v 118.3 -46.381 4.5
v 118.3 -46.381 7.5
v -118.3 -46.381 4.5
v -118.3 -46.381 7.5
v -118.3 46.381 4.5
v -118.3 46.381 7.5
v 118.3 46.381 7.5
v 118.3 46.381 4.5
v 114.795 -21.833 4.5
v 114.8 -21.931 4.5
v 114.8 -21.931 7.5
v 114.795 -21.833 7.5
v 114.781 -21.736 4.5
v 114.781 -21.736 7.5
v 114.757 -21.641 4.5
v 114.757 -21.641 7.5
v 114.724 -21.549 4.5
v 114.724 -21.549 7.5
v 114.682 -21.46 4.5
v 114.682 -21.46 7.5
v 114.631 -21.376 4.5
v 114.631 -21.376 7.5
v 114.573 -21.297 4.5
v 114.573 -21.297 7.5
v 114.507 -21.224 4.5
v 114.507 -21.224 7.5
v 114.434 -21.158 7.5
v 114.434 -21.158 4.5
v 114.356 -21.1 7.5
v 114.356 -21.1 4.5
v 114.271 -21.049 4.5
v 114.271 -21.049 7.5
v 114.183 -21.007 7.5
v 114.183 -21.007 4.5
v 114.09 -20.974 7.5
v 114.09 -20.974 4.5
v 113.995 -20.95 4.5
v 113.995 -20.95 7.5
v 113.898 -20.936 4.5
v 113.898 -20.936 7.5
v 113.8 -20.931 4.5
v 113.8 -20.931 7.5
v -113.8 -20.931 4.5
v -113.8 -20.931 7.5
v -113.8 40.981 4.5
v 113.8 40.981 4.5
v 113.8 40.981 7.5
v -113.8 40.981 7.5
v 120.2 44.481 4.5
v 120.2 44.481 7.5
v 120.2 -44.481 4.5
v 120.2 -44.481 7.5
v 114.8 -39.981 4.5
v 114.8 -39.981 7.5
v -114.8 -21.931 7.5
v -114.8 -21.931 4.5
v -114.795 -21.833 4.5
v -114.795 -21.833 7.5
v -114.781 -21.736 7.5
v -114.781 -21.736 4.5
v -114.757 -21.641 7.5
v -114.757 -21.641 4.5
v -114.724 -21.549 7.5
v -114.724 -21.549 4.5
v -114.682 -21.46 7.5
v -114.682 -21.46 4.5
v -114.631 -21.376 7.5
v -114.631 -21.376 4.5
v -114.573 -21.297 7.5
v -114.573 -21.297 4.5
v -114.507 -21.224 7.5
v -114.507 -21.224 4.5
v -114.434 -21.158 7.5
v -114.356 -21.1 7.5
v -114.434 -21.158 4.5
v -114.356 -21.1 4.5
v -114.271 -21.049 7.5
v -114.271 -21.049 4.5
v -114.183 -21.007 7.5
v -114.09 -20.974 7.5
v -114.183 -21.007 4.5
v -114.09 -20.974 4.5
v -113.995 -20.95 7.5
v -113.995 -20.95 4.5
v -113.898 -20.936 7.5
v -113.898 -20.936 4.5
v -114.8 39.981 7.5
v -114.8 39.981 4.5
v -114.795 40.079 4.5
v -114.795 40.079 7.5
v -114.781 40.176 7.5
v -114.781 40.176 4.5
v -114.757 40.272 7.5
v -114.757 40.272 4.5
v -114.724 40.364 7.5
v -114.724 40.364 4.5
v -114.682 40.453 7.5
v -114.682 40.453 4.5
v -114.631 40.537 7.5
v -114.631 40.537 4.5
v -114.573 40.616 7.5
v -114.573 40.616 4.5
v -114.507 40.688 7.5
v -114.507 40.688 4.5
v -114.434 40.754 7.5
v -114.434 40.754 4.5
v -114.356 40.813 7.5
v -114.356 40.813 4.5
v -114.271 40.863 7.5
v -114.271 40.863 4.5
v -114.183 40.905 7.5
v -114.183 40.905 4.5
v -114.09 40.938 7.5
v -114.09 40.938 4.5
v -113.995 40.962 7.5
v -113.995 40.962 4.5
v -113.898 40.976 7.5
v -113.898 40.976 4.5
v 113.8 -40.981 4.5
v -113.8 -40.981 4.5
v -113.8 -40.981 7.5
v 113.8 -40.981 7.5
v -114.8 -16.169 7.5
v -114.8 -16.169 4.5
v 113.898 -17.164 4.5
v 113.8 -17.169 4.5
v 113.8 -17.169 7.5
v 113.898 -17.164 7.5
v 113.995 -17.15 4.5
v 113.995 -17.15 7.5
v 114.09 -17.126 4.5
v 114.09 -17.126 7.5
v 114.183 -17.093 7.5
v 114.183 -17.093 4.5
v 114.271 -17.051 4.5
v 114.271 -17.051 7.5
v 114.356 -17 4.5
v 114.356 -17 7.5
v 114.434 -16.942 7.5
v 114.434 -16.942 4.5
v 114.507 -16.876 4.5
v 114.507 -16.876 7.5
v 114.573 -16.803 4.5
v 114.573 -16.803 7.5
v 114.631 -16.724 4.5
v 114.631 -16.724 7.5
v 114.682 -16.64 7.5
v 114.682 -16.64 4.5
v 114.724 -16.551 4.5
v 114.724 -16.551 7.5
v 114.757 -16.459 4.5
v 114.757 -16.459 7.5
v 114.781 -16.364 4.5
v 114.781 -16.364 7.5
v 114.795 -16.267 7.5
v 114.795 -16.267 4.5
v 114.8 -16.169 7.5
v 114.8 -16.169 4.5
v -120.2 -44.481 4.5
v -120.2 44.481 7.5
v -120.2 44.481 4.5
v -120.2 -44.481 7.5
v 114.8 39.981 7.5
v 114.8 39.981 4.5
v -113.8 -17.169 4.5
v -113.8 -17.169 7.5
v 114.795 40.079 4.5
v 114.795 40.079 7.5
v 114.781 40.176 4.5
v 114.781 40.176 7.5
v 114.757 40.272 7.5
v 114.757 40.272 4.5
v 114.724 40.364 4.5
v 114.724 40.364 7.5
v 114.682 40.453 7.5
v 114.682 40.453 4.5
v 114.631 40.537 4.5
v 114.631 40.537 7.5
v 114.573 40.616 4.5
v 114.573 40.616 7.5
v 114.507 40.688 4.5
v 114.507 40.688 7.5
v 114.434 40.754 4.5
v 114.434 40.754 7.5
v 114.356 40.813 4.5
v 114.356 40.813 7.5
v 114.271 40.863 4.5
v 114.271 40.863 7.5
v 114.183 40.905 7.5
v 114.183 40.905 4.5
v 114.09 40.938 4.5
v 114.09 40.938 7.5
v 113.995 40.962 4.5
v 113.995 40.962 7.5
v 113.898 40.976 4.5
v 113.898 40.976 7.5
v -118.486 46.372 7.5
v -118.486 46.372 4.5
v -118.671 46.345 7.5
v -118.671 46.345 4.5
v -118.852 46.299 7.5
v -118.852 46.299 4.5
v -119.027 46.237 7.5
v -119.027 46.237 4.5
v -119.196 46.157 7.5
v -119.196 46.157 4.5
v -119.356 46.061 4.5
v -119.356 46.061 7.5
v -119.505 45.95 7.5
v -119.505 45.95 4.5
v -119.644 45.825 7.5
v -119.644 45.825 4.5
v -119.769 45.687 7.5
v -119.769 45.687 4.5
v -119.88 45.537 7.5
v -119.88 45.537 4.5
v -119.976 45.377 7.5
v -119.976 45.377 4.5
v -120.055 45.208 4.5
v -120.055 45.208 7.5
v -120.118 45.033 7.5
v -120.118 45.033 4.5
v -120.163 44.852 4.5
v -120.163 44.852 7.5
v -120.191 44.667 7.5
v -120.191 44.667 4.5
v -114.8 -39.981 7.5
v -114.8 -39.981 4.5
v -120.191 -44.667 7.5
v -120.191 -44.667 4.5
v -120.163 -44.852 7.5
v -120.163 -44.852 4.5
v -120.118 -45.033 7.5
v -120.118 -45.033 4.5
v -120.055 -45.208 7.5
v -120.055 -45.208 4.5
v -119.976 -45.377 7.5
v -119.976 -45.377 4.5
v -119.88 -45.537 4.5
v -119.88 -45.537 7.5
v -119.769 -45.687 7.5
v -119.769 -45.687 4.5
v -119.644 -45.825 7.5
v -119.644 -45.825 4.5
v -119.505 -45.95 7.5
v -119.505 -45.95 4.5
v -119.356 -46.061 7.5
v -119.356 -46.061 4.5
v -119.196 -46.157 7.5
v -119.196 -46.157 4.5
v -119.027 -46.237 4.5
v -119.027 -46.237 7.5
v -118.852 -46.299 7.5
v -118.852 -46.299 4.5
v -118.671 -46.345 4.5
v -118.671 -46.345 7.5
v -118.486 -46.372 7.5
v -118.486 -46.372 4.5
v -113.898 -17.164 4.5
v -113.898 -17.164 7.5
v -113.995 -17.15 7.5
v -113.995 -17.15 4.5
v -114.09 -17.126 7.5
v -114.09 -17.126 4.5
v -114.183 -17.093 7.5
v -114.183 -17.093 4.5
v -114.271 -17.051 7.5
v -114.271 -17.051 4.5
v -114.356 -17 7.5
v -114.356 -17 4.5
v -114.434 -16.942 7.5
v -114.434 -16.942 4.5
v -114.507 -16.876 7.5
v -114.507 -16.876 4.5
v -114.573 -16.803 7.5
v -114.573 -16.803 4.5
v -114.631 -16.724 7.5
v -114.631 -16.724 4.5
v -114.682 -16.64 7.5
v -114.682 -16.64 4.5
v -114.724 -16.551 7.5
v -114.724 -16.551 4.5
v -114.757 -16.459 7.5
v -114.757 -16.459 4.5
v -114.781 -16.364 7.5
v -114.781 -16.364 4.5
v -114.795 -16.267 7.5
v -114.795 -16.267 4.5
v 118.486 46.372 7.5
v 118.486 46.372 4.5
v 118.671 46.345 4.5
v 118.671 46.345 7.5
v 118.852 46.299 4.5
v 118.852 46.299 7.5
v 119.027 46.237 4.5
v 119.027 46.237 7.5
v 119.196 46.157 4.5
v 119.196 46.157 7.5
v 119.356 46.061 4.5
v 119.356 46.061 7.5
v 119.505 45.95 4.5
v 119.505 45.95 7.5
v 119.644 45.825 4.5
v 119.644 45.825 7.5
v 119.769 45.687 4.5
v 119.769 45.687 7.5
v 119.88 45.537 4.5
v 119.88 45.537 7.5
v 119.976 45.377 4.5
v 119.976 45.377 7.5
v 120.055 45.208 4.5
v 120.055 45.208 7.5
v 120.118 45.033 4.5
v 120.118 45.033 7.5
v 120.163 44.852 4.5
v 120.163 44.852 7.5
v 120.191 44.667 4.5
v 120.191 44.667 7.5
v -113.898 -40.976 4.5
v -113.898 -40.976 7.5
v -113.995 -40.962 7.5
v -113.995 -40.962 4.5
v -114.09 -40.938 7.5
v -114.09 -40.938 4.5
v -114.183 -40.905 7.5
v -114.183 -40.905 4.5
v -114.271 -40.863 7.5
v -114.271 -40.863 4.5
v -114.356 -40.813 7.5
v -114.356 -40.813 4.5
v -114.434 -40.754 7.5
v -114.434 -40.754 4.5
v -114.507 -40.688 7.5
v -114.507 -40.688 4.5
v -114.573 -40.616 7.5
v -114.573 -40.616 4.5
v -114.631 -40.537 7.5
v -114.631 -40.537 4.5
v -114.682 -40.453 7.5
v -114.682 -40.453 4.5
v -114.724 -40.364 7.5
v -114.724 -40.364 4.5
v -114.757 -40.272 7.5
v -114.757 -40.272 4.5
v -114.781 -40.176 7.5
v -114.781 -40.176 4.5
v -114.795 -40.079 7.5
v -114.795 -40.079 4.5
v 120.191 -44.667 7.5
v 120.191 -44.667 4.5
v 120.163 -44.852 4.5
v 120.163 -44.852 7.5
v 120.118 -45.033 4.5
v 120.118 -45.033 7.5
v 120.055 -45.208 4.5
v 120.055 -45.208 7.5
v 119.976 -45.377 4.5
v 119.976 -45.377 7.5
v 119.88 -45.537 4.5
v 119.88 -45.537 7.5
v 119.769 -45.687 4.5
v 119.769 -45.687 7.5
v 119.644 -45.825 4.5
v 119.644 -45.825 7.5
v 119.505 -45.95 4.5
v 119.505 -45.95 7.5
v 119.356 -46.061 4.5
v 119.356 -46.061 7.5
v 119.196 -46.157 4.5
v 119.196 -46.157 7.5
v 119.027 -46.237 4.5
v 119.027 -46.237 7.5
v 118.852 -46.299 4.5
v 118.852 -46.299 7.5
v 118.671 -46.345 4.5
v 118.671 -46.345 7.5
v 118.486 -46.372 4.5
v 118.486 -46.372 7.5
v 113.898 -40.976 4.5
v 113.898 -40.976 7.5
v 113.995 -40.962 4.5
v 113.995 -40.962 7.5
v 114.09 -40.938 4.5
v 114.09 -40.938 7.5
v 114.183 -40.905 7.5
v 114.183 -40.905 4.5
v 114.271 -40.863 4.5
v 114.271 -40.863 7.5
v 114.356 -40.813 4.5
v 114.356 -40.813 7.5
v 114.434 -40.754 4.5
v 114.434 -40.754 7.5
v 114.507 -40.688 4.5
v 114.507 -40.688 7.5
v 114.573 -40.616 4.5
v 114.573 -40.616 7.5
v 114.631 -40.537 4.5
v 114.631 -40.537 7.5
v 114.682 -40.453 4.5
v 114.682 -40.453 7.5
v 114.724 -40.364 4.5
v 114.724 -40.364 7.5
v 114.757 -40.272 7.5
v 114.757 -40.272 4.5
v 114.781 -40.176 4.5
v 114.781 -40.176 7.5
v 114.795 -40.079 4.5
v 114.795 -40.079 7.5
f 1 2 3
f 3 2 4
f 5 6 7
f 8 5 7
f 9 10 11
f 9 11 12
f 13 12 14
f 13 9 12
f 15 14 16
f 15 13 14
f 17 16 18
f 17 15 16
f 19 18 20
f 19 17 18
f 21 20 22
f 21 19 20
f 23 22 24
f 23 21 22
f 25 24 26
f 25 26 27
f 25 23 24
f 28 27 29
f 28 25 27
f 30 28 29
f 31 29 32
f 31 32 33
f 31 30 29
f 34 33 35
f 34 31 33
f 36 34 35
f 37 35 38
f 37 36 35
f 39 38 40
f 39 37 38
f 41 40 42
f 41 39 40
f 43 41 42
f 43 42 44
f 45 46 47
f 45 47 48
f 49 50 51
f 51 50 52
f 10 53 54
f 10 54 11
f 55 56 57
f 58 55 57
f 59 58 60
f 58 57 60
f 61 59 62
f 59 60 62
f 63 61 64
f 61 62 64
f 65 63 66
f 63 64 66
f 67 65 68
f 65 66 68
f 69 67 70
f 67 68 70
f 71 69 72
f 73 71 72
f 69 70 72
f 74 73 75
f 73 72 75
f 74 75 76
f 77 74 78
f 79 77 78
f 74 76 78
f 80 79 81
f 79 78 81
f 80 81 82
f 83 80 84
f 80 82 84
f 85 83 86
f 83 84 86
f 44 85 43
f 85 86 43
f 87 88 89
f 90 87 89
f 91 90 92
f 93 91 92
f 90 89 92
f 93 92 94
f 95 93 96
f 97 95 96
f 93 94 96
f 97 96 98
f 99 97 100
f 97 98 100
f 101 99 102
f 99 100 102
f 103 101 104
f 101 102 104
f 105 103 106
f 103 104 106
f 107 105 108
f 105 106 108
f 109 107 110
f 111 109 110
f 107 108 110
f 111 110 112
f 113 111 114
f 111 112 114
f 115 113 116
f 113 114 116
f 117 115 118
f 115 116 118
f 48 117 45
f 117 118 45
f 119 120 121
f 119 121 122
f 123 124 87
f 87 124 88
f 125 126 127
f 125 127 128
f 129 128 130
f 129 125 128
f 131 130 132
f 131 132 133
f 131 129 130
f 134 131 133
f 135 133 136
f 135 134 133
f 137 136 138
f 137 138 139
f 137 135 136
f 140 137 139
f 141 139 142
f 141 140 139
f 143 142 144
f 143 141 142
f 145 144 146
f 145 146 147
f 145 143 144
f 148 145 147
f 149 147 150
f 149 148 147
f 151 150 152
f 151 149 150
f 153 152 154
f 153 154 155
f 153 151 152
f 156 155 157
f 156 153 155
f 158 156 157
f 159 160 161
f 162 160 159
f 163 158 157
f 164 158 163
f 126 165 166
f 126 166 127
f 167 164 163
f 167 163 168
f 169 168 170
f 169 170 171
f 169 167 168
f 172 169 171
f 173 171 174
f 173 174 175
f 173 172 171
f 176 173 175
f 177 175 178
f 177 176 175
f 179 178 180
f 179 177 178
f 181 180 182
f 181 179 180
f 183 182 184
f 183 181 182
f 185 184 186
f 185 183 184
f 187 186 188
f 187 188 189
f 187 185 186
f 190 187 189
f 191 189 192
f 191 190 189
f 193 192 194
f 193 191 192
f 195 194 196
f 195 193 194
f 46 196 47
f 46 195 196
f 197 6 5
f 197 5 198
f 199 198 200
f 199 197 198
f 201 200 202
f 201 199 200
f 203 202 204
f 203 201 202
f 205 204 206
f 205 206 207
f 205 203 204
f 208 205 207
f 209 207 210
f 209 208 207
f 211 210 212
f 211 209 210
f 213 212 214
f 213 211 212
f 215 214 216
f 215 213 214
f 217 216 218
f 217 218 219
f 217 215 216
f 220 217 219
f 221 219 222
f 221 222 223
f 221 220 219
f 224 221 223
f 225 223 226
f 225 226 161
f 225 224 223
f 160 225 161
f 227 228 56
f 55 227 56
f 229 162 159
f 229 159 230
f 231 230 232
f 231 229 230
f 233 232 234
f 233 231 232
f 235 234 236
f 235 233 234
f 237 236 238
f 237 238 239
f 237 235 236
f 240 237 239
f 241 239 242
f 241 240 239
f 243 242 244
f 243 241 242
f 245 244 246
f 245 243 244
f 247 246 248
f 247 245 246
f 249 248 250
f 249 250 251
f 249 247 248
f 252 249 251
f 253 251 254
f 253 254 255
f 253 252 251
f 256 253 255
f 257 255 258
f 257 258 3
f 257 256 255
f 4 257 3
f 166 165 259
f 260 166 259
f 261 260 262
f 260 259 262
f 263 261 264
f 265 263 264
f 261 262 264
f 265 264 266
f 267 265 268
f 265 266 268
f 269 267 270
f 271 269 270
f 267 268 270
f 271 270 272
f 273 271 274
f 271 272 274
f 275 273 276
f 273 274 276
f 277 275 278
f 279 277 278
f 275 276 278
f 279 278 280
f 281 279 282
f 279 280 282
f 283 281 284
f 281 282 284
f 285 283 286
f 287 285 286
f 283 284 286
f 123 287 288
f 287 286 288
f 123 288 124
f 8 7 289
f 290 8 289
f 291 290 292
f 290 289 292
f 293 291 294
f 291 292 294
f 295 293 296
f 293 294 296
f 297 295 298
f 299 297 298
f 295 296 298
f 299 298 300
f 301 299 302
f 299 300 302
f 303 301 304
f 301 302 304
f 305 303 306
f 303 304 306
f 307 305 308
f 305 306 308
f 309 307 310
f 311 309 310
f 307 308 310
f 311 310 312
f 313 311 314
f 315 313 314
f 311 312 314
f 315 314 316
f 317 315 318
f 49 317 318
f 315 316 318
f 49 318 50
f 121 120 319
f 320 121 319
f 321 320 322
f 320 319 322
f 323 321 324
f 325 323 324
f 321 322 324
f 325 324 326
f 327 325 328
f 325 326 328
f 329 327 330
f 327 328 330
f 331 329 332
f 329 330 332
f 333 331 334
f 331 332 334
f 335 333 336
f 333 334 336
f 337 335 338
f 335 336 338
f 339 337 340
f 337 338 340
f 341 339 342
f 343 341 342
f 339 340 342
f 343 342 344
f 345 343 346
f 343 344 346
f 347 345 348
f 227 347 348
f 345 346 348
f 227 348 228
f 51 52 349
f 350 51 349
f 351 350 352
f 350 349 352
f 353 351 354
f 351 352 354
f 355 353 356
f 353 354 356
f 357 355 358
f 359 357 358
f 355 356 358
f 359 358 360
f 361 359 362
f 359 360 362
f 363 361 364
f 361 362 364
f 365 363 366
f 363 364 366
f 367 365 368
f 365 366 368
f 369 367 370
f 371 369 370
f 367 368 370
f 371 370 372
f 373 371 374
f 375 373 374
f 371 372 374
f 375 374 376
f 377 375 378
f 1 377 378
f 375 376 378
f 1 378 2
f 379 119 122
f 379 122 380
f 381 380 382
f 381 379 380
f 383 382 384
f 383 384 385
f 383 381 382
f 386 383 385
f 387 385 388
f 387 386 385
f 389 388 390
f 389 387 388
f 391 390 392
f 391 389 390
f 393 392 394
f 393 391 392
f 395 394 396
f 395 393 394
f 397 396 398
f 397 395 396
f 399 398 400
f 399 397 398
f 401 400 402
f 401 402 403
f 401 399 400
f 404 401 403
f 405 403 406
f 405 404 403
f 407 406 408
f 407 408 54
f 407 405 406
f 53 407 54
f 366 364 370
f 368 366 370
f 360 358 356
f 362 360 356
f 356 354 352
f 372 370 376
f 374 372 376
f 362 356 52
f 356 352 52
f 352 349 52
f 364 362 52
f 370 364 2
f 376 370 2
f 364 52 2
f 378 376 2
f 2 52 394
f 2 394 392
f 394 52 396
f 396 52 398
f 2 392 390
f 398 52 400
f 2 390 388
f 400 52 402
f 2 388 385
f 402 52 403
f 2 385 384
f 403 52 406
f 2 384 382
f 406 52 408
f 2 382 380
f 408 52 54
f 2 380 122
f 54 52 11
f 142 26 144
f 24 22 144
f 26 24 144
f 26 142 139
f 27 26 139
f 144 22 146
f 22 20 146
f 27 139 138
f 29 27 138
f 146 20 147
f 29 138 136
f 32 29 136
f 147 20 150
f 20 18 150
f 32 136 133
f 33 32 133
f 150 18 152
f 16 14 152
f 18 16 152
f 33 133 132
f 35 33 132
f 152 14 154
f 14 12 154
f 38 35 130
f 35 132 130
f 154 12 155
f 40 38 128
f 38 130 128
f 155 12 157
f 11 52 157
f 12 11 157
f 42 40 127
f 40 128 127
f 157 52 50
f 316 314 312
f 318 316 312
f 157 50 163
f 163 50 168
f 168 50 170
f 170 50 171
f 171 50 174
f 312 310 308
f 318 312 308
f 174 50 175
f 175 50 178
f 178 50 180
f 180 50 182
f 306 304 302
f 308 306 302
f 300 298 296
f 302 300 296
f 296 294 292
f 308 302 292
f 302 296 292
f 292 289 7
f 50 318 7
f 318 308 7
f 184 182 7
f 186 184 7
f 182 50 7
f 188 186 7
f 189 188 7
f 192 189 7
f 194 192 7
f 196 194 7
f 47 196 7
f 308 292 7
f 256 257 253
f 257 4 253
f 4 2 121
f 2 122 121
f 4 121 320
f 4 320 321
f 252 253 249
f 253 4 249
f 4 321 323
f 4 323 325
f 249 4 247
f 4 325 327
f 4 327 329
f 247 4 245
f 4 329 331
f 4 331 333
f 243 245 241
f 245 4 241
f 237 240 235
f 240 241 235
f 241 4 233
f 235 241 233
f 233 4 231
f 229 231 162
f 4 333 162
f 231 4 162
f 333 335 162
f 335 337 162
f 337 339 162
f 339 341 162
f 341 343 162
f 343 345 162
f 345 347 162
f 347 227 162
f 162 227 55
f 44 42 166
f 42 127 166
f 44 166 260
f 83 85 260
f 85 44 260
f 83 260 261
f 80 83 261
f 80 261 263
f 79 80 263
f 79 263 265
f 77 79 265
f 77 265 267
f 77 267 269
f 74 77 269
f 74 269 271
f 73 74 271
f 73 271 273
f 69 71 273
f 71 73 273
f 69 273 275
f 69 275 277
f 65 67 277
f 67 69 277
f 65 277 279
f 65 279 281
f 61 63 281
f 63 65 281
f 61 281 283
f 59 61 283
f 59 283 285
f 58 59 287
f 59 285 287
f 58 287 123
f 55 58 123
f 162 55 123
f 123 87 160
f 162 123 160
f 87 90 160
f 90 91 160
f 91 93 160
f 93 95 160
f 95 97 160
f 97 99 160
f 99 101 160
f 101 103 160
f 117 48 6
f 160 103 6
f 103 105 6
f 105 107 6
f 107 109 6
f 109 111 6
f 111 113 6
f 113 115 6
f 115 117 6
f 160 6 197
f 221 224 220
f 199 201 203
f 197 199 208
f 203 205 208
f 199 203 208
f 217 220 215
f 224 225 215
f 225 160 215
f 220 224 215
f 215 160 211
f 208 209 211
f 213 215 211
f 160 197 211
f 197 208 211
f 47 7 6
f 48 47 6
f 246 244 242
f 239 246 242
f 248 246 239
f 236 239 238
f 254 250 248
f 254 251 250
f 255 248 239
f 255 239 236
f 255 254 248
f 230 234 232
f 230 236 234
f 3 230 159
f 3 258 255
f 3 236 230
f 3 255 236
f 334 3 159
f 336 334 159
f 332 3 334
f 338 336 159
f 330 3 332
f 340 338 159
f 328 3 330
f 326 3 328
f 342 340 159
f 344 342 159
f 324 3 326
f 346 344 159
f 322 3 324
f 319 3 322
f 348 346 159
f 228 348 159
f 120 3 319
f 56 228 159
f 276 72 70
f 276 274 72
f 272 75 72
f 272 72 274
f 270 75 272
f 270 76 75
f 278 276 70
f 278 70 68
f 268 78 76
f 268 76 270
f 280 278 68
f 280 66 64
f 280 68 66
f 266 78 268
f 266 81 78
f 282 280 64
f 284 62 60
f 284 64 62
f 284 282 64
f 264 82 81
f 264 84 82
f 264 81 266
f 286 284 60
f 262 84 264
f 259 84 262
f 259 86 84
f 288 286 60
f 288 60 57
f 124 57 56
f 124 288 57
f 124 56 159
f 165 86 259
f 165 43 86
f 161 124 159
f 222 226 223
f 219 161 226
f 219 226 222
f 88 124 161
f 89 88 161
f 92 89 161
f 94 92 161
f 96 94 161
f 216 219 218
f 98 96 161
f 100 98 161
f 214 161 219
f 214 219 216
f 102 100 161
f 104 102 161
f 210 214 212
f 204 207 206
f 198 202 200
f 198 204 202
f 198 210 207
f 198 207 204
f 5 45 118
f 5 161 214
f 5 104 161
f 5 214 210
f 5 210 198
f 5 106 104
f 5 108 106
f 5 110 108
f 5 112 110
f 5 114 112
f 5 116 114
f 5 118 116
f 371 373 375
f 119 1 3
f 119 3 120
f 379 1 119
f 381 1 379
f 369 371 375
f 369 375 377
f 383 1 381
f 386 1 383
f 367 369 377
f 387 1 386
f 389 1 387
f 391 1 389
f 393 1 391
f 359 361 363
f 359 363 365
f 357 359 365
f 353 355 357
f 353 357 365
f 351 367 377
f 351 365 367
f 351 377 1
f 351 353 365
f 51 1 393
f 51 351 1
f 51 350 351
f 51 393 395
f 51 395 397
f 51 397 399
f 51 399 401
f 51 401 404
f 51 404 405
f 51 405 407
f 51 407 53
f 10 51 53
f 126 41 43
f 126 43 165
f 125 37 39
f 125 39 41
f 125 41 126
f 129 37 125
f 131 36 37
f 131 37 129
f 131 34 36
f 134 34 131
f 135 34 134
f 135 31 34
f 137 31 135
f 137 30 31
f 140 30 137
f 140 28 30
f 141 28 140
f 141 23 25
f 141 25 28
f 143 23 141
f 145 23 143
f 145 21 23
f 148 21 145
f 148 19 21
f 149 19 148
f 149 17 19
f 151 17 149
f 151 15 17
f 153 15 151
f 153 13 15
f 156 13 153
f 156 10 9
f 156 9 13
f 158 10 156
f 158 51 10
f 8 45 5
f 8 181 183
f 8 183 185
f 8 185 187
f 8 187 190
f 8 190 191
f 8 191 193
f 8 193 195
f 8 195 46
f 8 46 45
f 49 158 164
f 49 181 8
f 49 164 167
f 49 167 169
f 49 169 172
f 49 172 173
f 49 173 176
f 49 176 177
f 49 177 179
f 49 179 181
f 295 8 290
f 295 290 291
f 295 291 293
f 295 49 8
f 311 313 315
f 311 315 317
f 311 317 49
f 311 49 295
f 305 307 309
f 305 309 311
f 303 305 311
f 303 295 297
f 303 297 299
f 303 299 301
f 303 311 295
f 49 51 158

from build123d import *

# Parameters (mm, degrees)
SHAPEBINDER_R   = 1.75
PAD020_DEPTH    = 3
SKETCH057_R     = 1.75
PAD021_DEPTH    = 3
POCKET032_DEPTH = 3


with BuildPart() as body:
    # ShapeBinder → Pad020 (new body)
    with BuildSketch(Plane(origin=(-71.291879, -3.78464, 4.5), x_dir=(0, 1, 0), z_dir=(0, 0, 1))):
        with BuildLine():
            Line((44.76589, 42.508121), (44.76589, -71.291879))
            Line((44.76589, -71.291879), (46.11589, -71.291879))
            ThreePointArc((46.11589, -71.291879), (47.86589, -69.541879), (49.61589, -71.291879))
            Line((49.61589, -71.291879), (50.26589, -71.291879))
            Line((50.26589, -71.291879), (50.26589, 47.008121))
            ThreePointArc((50.26589, 47.008121), (49.680103, 48.422335), (48.26589, 49.008121))
            Line((48.26589, 49.008121), (-40.69661, 49.008121))
            ThreePointArc((-40.69661, 49.008121), (-42.110824, 48.422335), (-42.69661, 47.008121))
            Line((-42.69661, 47.008121), (-42.69661, -71.291879))
            Line((-42.69661, -71.291879), (-42.04661, -71.291879))
            ThreePointArc((-42.04661, -71.291879), (-40.29661, -69.541879), (-38.54661, -71.291879))
            Line((-38.54661, -71.291879), (-37.19661, -71.291879))
            Line((-37.19661, -71.291879), (-37.19661, 42.508121))
            ThreePointArc((-37.19661, 42.508121), (-36.903717, 43.215228), (-36.19661, 43.508121))
            Line((-36.19661, 43.508121), (-18.14661, 43.508121))
            ThreePointArc((-18.14661, 43.508121), (-17.439503, 43.215228), (-17.14661, 42.508121))
            Line((-17.14661, 42.508121), (-17.14661, -71.291879))
            Line((-17.14661, -71.291879), (-13.38411, -71.291879))
            Line((-13.38411, -71.291879), (-13.38411, 42.508121))
            ThreePointArc((-13.38411, 42.508121), (-13.091217, 43.215228), (-12.38411, 43.508121))
            Line((-12.38411, 43.508121), (43.76589, 43.508121))
            ThreePointArc((43.76589, 43.508121), (44.472997, 43.215228), (44.76589, 42.508121))
        make_face()
        with Locations((-40.29661, 38.508121)):
            Circle(SHAPEBINDER_R, mode=Mode.SUBTRACT)
        with Locations((47.86589, 38.508121)):
            Circle(SHAPEBINDER_R, mode=Mode.SUBTRACT)
    extrude(amount=PAD020_DEPTH)

    # Sketch057 (on Face26 of Pad020) → Pad021 (join)
    with BuildSketch(Plane.XY.offset(7.5)):
        with Locations((-109.8, -44.08125)):
            Circle(SKETCH057_R)
        with Locations((-109.8, 44.08125)):
            Circle(SKETCH057_R)
        with BuildLine():
            ThreePointArc((0, 45.83125), (-1.75, 44.08125), (0, 42.33125))
            Line((0, 45.83125), (0, 42.33125))
        make_face()
        with BuildLine():
            ThreePointArc((0, -42.33125), (-1.75, -44.08125), (0, -45.83125))
            Line((0, -45.83125), (0, -42.33125))
        make_face()
    extrude(amount=-PAD021_DEPTH)

    # Sketch058 (on Face20 of Pad021) → Pocket032 (cut)
    with BuildSketch(Plane.XY.offset(7.5)):
        with BuildLine():
            ThreePointArc((-118.3, 48.48125), (-121.128427, 47.309677), (-122.3, 44.48125))
            Line((-122.3, -44.48125), (-122.3, 44.48125))
            ThreePointArc((-122.3, -44.48125), (-121.128427, -47.309677), (-118.3, -48.48125))
            Line((2, -48.48125), (-118.3, -48.48125))
            Line((2, 48.48125), (2, -48.48125))
            Line((-118.3, 48.48125), (2, 48.48125))
        make_face()
        with BuildLine():
            ThreePointArc((-118.3, 46.38125), (-119.643503, 45.824753), (-120.2, 44.48125))
            Line((-120.2, 44.48125), (-120.2, -44.48125))
            ThreePointArc((-120.2, -44.48125), (-119.643503, -45.824753), (-118.3, -46.38125))
            Line((-118.3, -46.38125), (0, -46.38125))
            Line((0, -46.38125), (0, 46.38125))
            Line((0, 46.38125), (-118.3, 46.38125))
        make_face(mode=Mode.SUBTRACT)
    extrude(amount=-POCKET032_DEPTH, mode=Mode.SUBTRACT)


with BuildPart() as part_mirroring003:
    # Part__Mirroring003: instance of Body
    add(body.part.mirror(Plane(origin=(0, 0, 0), x_dir=(0, -1, 0), z_dir=(1, 0, 0))))


with BuildPart() as case_inlay:
    # Fusion003 base: copy of Body
    add(body.part)

    # Fusion003: union Part__Mirroring003
    add(part_mirroring003.part)


solid = case_inlay.part
